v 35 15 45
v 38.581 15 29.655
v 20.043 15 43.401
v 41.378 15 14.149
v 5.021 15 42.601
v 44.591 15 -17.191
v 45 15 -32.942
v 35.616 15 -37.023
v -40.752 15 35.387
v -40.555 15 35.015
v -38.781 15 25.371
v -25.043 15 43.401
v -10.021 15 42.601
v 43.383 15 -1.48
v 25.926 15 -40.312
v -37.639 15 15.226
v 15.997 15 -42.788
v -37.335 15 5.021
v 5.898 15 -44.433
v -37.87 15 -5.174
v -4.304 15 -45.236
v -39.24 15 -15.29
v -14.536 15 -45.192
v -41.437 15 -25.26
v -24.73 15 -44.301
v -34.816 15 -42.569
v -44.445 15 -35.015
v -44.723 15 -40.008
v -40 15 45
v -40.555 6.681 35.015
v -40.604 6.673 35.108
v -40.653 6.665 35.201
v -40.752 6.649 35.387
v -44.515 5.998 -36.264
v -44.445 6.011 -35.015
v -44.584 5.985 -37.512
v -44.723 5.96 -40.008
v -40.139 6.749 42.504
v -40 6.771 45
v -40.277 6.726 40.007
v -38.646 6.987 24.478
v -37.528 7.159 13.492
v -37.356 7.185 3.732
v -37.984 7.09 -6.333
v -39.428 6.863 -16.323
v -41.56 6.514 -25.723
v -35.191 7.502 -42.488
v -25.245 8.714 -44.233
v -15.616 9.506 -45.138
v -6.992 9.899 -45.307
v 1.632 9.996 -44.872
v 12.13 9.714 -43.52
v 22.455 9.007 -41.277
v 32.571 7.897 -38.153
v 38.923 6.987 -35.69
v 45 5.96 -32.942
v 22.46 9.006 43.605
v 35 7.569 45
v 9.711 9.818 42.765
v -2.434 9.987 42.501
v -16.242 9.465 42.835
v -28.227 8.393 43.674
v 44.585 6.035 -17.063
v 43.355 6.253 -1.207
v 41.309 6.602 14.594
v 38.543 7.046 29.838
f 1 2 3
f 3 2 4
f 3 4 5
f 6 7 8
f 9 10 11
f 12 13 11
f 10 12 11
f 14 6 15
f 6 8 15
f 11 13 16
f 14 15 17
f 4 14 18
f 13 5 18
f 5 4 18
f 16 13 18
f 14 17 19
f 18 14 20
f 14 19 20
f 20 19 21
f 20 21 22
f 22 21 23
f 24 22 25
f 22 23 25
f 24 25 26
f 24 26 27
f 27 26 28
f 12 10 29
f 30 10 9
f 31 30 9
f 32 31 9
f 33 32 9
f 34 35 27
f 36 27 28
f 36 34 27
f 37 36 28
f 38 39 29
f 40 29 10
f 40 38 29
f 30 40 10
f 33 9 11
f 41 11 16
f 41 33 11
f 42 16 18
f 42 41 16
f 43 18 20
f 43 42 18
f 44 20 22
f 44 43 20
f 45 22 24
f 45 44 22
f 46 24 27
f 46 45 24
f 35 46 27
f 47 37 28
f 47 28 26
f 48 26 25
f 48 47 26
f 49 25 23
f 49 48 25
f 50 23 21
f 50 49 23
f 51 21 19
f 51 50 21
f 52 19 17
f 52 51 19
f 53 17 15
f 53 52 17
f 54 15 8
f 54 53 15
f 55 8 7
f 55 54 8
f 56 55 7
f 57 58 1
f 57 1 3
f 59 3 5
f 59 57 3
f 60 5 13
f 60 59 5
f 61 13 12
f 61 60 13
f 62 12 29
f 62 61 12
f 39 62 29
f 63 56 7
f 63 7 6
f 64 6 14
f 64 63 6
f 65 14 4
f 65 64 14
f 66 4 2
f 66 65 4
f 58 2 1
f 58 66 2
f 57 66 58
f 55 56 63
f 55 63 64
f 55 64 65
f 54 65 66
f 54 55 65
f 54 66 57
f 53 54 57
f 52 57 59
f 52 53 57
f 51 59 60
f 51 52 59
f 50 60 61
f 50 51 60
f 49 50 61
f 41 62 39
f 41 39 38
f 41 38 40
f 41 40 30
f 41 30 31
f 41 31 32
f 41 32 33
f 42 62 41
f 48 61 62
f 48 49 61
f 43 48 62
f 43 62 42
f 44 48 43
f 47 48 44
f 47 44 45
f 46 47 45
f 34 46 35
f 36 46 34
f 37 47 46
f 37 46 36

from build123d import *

# Parameters (mm, degrees)
BOSS_EXTRUDE1_DEPTH     = 15
CUT_EXTRUDE2_DEPTH      = 58
CUT_EXTRUDE2_DEPTH_BACK = 63


with BuildPart() as part:
    # Sketch1 → Boss-Extrude1 (new body)
    with BuildSketch(Plane(origin=(0, 0, 0), x_dir=(1, 0, 0), z_dir=(0, 1, 0))):
        with BuildLine():
            Line((-40, -45), (-40.554700196, -35.015396468))
            Line((-40.554700196, -35.015396468), (-40.751707535, -35.387312812))
            ThreePointArc((-40.751707535, -35.387312812), (-37.497275944, 0.081671518), (-44.445299804, 35.015396468))
            Line((-44.445299804, 35.015396468), (-44.722649902, 40.007698234))
            ThreePointArc((-44.722649902, 40.007698234), (0.805300702, 44.940375619), (45, 32.94228634))
            ThreePointArc((45, 32.94228634), (42.479652573, -6.346996403), (35, -45))
            ThreePointArc((35, -45), (-2.5, -42.500708249), (-40, -45))
        make_face()
    extrude(amount=BOSS_EXTRUDE1_DEPTH)

    # Sketch3 → Cut-Extrude2 (cut, two sides)
    with BuildSketch(Plane.XY) as cut_extrude2_sk:
        with BuildLine():
            Line((-49.722649902, 5), (-49.722649902, -2.927919572))
            Line((-49.722649902, -2.927919572), (50, -2.927919572))
            Line((50, -2.927919572), (50, 5))
            ThreePointArc((50, 5), (0.138675049, 10.0002316), (-49.722649902, 5))
        make_face()
    extrude(amount=CUT_EXTRUDE2_DEPTH, mode=Mode.SUBTRACT)
    extrude(cut_extrude2_sk.sketch, amount=-CUT_EXTRUDE2_DEPTH_BACK, mode=Mode.SUBTRACT)


solid = part.part
